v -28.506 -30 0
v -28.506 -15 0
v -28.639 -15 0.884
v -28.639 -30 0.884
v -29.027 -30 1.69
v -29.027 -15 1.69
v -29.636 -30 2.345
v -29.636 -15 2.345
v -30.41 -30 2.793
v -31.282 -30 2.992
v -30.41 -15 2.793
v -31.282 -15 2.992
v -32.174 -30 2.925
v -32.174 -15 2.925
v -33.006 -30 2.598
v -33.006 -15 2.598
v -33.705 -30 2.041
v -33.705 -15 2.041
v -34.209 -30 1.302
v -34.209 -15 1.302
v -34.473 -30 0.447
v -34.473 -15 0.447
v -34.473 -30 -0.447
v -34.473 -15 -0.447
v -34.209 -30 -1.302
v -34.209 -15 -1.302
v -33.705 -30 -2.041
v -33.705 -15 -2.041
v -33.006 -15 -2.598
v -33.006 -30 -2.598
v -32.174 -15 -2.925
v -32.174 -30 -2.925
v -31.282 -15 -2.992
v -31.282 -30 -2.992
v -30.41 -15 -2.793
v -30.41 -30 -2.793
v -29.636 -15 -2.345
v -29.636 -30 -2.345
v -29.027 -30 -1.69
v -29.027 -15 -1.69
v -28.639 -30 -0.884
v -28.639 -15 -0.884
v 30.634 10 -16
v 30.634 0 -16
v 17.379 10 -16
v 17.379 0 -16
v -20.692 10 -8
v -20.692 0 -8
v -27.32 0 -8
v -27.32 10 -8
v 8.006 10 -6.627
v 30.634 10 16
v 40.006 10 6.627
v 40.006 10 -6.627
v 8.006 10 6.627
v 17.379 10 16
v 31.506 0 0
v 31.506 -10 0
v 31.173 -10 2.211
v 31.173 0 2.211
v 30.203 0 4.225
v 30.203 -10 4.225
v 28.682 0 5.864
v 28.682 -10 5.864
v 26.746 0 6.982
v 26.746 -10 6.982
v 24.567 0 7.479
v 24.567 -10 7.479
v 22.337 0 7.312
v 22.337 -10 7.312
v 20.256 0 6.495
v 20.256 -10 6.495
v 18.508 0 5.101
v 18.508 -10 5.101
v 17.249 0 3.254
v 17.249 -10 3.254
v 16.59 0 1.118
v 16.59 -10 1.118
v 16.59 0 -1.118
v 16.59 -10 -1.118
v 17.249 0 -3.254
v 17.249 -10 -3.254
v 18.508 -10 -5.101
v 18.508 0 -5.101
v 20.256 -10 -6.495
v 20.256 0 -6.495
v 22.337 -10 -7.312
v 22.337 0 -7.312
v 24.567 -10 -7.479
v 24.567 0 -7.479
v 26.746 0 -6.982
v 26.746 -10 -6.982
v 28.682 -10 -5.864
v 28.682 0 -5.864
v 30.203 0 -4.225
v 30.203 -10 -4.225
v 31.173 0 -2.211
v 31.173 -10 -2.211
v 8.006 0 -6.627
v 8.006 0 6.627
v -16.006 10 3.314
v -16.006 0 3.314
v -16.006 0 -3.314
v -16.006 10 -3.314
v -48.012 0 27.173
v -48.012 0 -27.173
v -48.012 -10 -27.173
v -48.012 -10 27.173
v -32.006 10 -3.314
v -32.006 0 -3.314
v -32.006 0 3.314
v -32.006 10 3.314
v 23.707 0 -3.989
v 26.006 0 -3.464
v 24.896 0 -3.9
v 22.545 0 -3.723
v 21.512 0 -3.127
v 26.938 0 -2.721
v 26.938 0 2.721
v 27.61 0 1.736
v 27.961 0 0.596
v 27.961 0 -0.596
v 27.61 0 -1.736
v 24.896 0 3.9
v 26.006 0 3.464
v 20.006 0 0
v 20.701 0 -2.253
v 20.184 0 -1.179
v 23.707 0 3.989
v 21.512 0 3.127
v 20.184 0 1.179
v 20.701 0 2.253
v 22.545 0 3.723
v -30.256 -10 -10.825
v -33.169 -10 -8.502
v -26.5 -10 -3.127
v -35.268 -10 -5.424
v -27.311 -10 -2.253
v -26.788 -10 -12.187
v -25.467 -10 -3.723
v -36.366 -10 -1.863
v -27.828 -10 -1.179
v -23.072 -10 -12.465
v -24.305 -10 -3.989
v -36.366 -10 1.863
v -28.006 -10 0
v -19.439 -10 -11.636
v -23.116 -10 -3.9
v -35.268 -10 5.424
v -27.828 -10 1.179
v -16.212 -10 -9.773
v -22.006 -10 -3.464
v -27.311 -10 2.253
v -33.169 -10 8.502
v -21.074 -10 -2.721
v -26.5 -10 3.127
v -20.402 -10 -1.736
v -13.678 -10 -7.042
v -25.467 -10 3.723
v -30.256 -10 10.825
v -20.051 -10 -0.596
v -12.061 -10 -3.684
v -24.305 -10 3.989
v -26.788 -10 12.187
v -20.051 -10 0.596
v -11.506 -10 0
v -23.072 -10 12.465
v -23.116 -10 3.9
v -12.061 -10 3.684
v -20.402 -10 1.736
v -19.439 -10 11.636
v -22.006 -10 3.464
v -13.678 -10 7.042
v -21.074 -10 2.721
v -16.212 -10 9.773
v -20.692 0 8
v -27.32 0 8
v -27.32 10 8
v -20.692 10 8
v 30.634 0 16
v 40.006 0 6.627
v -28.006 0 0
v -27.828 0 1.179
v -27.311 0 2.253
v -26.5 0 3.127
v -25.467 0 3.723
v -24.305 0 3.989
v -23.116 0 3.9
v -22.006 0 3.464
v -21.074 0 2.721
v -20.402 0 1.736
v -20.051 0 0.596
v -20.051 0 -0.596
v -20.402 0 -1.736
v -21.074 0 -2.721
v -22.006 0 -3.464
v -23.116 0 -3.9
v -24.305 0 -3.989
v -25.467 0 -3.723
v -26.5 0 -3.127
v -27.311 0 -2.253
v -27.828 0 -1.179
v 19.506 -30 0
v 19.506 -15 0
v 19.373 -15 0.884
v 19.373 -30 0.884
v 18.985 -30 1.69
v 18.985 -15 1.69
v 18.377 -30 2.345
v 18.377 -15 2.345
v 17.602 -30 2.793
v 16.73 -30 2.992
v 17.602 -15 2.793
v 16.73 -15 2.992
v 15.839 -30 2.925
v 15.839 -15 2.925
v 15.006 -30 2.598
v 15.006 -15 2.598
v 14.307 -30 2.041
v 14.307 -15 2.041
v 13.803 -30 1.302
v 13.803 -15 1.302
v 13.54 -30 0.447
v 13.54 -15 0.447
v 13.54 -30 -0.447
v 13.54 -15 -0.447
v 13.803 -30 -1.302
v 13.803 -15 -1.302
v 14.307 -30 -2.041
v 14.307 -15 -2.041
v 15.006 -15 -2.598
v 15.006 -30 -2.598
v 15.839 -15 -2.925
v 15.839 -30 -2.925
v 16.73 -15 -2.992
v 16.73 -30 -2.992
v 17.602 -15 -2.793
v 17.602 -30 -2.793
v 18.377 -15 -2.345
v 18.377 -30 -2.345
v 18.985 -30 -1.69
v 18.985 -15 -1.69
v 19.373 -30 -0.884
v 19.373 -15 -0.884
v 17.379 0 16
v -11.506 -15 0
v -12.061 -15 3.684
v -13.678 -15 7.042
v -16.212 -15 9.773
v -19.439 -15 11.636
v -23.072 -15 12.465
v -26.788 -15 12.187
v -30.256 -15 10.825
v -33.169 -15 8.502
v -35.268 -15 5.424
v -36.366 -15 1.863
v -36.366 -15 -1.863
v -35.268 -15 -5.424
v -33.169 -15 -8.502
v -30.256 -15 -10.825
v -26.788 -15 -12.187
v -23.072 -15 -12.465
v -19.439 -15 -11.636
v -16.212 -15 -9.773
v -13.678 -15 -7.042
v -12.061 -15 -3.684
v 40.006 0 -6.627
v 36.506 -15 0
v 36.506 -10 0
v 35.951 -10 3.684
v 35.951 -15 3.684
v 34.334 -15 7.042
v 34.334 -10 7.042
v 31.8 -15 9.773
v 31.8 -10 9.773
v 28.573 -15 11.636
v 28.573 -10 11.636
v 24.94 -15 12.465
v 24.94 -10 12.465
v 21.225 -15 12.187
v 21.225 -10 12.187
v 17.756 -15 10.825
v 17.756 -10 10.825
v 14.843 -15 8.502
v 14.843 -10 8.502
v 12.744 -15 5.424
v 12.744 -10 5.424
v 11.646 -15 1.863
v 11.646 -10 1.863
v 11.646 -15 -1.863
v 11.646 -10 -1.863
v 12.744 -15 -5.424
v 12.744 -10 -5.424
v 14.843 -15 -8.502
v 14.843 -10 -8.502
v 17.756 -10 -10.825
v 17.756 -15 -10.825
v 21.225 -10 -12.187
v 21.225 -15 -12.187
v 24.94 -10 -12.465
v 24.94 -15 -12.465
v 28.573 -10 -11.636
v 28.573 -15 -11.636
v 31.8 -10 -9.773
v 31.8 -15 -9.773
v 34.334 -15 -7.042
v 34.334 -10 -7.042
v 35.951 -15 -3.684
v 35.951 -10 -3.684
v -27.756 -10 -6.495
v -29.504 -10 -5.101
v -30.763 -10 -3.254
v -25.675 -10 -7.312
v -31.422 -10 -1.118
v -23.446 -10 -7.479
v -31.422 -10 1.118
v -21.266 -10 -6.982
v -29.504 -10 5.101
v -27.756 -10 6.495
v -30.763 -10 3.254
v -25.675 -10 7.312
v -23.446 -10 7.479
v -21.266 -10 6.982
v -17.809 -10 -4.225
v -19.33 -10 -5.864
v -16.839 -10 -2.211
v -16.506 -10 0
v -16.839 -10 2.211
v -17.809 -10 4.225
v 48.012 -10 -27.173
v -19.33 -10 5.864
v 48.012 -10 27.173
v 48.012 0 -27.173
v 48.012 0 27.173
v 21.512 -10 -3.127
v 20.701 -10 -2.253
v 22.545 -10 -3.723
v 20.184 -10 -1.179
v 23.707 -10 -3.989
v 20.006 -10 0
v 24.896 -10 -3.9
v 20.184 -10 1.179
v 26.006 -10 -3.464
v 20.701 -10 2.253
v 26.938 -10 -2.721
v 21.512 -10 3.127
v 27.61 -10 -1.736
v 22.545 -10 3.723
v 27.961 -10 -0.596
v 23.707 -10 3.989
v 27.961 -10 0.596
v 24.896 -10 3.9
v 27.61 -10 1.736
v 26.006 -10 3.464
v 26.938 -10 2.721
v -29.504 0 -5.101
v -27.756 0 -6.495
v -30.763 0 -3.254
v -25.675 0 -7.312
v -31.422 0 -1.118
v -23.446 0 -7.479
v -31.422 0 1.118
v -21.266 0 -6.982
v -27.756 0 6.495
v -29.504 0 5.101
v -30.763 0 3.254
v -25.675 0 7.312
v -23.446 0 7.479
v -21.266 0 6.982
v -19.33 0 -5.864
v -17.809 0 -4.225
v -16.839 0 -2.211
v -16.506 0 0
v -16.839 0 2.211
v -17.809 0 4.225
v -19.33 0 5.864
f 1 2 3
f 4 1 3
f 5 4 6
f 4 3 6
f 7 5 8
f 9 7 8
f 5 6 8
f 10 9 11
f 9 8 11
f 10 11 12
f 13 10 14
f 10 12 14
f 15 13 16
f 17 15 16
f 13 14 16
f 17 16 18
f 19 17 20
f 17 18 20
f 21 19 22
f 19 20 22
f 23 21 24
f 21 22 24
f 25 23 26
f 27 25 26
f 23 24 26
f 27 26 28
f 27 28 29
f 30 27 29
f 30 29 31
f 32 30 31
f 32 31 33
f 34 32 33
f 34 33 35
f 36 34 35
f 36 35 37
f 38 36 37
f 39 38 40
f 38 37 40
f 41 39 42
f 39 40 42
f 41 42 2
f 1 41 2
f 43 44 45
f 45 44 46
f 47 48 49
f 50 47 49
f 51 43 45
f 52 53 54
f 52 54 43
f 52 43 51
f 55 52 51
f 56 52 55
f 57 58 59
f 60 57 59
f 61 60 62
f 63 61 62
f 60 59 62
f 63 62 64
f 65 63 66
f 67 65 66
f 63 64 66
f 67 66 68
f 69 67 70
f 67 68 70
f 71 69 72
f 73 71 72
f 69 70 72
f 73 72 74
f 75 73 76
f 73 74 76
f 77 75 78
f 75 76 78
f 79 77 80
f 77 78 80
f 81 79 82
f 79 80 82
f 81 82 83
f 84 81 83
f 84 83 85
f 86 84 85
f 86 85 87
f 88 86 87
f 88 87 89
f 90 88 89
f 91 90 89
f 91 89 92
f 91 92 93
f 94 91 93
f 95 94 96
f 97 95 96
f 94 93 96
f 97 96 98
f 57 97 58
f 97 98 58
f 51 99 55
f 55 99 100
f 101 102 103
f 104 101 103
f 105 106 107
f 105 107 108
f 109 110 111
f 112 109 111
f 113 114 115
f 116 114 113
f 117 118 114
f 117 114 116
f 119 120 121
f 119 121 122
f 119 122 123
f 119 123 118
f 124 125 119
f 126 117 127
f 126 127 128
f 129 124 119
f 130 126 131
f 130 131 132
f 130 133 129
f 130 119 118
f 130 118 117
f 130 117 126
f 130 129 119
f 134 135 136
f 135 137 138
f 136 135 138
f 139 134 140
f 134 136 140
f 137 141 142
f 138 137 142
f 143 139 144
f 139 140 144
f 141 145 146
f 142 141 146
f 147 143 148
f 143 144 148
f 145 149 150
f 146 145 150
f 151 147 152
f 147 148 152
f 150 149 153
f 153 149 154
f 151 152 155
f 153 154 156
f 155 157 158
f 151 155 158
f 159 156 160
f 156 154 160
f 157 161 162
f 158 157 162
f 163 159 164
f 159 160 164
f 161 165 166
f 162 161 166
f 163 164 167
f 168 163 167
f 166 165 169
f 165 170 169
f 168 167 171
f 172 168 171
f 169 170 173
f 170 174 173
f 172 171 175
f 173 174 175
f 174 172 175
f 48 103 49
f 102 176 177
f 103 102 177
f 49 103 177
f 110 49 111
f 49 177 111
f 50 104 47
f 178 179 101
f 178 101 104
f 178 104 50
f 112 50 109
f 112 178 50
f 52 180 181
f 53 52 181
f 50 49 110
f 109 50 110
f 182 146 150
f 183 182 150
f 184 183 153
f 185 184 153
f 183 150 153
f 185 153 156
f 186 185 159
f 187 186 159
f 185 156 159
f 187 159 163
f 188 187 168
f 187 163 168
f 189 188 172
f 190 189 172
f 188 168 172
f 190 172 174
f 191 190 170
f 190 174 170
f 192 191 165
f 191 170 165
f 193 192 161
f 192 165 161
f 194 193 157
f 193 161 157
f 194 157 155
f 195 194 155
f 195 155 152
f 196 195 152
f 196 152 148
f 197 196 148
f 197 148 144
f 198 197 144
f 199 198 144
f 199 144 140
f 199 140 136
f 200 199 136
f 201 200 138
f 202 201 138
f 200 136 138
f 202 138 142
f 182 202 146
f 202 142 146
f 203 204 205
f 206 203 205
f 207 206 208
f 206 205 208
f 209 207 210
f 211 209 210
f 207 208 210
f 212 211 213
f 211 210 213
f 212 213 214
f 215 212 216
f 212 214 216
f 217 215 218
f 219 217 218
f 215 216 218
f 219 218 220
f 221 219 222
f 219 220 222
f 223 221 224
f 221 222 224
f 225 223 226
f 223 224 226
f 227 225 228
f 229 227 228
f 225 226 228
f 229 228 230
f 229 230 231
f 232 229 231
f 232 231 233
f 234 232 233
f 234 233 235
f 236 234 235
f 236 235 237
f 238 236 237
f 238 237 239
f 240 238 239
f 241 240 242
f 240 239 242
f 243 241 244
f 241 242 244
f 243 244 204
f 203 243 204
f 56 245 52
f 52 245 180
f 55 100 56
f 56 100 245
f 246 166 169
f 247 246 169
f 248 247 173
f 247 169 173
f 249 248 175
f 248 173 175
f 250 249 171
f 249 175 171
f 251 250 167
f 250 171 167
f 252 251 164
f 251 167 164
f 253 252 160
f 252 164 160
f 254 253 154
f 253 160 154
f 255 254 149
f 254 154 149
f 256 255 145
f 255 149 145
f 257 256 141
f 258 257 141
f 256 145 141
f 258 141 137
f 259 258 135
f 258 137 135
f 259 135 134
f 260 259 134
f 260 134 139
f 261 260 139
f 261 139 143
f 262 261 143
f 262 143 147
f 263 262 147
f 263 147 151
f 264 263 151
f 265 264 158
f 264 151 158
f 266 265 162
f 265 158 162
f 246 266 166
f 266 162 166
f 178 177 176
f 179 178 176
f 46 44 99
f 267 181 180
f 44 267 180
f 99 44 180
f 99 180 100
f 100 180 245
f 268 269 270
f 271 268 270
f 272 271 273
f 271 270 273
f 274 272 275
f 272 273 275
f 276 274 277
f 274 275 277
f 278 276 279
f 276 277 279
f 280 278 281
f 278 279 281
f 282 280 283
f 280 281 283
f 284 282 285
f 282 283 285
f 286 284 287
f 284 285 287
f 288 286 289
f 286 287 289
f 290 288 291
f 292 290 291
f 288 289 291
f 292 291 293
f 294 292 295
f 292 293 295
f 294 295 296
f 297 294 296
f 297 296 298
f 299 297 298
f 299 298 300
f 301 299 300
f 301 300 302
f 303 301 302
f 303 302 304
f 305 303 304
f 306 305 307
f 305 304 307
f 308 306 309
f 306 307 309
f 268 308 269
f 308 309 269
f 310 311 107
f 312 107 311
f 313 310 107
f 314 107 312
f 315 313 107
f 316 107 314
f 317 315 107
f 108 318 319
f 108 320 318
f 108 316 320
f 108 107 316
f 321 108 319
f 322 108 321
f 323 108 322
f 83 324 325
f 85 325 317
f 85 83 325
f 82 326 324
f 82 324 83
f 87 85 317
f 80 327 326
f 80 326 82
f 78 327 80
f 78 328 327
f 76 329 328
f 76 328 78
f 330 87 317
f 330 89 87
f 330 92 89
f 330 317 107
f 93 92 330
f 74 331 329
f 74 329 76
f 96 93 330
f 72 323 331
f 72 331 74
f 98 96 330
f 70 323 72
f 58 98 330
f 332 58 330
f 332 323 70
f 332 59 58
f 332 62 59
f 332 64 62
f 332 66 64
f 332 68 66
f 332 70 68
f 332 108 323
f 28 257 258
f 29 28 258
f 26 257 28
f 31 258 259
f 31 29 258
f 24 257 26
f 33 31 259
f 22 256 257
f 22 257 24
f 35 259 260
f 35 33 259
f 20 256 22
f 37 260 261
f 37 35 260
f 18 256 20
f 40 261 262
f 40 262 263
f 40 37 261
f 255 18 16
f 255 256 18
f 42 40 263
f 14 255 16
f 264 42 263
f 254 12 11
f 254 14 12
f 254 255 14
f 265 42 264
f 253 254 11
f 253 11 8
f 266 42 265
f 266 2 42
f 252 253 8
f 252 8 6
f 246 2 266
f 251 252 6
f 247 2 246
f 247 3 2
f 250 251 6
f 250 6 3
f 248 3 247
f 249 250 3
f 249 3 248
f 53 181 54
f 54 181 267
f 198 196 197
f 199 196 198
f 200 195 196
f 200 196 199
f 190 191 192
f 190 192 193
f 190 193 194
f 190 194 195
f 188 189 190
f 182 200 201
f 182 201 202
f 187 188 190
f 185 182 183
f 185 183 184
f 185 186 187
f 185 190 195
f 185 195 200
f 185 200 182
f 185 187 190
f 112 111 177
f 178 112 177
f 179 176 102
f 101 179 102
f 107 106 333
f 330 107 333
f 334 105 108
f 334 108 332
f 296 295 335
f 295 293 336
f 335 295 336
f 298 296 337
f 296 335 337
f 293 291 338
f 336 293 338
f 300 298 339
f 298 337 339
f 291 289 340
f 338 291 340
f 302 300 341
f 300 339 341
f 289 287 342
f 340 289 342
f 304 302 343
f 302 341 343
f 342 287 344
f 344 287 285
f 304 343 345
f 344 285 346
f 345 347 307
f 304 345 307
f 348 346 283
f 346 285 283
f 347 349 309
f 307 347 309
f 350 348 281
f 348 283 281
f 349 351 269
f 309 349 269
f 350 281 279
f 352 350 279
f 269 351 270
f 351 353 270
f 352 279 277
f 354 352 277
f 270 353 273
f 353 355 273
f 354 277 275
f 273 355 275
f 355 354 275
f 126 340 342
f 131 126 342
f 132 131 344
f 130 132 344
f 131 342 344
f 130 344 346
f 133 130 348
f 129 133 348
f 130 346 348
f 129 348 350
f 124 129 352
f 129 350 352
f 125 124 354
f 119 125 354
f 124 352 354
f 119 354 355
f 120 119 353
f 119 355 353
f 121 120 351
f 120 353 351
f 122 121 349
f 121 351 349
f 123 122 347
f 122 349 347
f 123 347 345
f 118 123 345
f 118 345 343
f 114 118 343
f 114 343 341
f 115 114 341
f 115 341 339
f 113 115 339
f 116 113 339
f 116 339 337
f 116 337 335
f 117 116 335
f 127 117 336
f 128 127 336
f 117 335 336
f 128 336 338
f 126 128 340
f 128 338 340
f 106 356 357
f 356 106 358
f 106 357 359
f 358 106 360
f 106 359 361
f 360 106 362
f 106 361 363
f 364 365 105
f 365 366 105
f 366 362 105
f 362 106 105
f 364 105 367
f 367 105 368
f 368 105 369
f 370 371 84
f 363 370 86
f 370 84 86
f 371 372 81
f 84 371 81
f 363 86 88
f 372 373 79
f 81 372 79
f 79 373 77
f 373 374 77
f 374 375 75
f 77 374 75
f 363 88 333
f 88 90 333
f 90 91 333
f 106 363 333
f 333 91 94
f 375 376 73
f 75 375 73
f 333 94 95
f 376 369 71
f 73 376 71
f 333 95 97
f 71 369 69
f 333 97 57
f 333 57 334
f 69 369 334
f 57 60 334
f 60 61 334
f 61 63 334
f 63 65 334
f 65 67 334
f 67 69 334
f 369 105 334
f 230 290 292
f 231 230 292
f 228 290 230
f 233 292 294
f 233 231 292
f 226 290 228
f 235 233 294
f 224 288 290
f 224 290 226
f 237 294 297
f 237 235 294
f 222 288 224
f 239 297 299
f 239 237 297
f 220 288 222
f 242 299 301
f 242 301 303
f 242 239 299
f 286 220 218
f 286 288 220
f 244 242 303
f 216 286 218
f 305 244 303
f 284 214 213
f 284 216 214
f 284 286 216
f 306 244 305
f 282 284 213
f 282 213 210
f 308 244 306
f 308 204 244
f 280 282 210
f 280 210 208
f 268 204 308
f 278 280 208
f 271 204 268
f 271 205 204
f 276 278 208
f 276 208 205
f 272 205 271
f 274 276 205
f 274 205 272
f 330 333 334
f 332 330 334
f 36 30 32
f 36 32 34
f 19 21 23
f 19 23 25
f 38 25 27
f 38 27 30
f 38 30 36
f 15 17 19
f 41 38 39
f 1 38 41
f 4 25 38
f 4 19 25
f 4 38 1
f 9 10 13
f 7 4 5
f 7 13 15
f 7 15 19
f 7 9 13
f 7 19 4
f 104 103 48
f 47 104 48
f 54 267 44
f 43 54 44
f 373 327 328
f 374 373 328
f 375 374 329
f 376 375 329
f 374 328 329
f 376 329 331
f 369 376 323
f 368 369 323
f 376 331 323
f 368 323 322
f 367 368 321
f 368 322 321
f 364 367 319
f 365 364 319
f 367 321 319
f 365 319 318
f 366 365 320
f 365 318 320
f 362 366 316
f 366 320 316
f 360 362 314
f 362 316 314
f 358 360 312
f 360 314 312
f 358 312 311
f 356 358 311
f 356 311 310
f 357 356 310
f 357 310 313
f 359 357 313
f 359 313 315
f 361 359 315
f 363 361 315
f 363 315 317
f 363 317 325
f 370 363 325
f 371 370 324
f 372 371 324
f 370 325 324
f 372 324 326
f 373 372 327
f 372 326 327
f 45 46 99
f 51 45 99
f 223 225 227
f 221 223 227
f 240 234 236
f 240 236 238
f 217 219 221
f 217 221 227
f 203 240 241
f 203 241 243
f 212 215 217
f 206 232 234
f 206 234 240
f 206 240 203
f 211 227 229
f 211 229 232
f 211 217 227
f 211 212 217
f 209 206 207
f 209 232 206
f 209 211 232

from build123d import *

# Parameters (mm, degrees)
F0_W      = 96.024364233
F0_H      = 54.3456934392
F1_DEPTH  = 10
F2_R      = 7.5
F3_DEPTH  = 10
F4_R      = 12.5
F4_R_2    = 7.5
F5_DEPTH  = 5
F6_R      = 4
F7_DEPTH  = 10
F8_R      = 4
F9_DEPTH  = 10
F10_R     = 3
F11_DEPTH = 15


with BuildPart() as f1:
    # F0 (on Front) → F1 (new body)
    with BuildSketch(Plane.XZ):
        Rectangle(F0_W, F0_H)
    extrude(amount=F1_DEPTH)

    # F2 (on face) → F3 (cut, through all)
    with BuildSketch(Plane.XZ.offset(10)):
        with Locations((-24.0060910583, 0)):
            Circle(F2_R)
        with Locations((24.0060910583, 0)):
            Circle(F2_R)
    extrude(amount=-F3_DEPTH, mode=Mode.SUBTRACT)


with BuildPart() as f5:
    # F4 (on face) → F5 (new body)
    with BuildSketch(Plane.XZ.offset(10)):
        with Locations((-24.0060910583, 0)):
            Circle(F4_R)
        with Locations((-24.0060910583, 0)):
            Circle(F4_R_2, mode=Mode.SUBTRACT)
        with Locations((-24.0060910583, 0)):
            Circle(F4_R_2)
    extrude(amount=F5_DEPTH)

    # F6 (on face) → F7, piece 2 (join, through all)
    with BuildSketch(Plane(origin=(0, -10, 0), x_dir=(-1, 0, 0), z_dir=(0, 1, 0))):
        with Locations((24.0060910583, 0)):
            Circle(F6_R)
    extrude(amount=F7_DEPTH)

    # F10 (on face) → F11, piece 2 (join)
    with BuildSketch(Plane.XZ.offset(15)):
        with Locations((-31.5060910583, 0)):
            Circle(F10_R)
    extrude(amount=F11_DEPTH)


with BuildPart() as f5b:
    # F4 (on face) → F5, piece 2 (new body)
    with BuildSketch(Plane.XZ.offset(10)):
        with Locations((24.0060910583, 0)):
            Circle(F4_R)
        with Locations((24.0060910583, 0)):
            Circle(F4_R_2, mode=Mode.SUBTRACT)
        with Locations((24.0060910583, 0)):
            Circle(F4_R_2)
    extrude(amount=F5_DEPTH)

    # F6 (on face) → F7 (join, through all)
    with BuildSketch(Plane(origin=(0, -10, 0), x_dir=(-1, 0, 0), z_dir=(0, 1, 0))):
        with Locations((-24.0060910583, 0)):
            Circle(F6_R)
    extrude(amount=F7_DEPTH)

    # F10 (on face) → F11 (join)
    with BuildSketch(Plane.XZ.offset(15)):
        with Locations((16.5060910583, 0)):
            Circle(F10_R)
    extrude(amount=F11_DEPTH)


with BuildPart() as f9:
    # F8 (on face) → F9 (new body)
    with BuildSketch(Plane(origin=(0, 0, 0), x_dir=(-1, 0, 0), z_dir=(0, 1, 0))):
        Polygon((-8.0060910583, -6.627416998), (-8.0060910583, 6.627416998), (-17.3786740603, 16), (-30.6335080562, 16), (-40.0060910583, 6.627416998), (-40.0060910583, -6.627416998), (-30.6335080562, -16), (-17.3786740603, -16), align=None)
        with Locations((-24.0060910583, 0)):
            Circle(F8_R, mode=Mode.SUBTRACT)
        with Locations((-24.0060910583, 0)):
            Circle(F8_R)
    extrude(amount=F9_DEPTH)


with BuildPart() as f9b:
    # F8 (on face) → F9, piece 2 (new body)
    with BuildSketch(Plane(origin=(0, 0, 0), x_dir=(-1, 0, 0), z_dir=(0, 1, 0))):
        Polygon((27.3197995572, 8), (20.6923825593, 8), (16.0060910583, 3.313708499), (16.0060910583, -3.313708499), (20.6923825593, -8), (27.3197995572, -8), (32.0060910583, -3.313708499), (32.0060910583, 3.313708499), align=None)
    extrude(amount=F9_DEPTH)


solid = Compound([f1.part, f5.part, f5b.part, f9.part, f9b.part])
